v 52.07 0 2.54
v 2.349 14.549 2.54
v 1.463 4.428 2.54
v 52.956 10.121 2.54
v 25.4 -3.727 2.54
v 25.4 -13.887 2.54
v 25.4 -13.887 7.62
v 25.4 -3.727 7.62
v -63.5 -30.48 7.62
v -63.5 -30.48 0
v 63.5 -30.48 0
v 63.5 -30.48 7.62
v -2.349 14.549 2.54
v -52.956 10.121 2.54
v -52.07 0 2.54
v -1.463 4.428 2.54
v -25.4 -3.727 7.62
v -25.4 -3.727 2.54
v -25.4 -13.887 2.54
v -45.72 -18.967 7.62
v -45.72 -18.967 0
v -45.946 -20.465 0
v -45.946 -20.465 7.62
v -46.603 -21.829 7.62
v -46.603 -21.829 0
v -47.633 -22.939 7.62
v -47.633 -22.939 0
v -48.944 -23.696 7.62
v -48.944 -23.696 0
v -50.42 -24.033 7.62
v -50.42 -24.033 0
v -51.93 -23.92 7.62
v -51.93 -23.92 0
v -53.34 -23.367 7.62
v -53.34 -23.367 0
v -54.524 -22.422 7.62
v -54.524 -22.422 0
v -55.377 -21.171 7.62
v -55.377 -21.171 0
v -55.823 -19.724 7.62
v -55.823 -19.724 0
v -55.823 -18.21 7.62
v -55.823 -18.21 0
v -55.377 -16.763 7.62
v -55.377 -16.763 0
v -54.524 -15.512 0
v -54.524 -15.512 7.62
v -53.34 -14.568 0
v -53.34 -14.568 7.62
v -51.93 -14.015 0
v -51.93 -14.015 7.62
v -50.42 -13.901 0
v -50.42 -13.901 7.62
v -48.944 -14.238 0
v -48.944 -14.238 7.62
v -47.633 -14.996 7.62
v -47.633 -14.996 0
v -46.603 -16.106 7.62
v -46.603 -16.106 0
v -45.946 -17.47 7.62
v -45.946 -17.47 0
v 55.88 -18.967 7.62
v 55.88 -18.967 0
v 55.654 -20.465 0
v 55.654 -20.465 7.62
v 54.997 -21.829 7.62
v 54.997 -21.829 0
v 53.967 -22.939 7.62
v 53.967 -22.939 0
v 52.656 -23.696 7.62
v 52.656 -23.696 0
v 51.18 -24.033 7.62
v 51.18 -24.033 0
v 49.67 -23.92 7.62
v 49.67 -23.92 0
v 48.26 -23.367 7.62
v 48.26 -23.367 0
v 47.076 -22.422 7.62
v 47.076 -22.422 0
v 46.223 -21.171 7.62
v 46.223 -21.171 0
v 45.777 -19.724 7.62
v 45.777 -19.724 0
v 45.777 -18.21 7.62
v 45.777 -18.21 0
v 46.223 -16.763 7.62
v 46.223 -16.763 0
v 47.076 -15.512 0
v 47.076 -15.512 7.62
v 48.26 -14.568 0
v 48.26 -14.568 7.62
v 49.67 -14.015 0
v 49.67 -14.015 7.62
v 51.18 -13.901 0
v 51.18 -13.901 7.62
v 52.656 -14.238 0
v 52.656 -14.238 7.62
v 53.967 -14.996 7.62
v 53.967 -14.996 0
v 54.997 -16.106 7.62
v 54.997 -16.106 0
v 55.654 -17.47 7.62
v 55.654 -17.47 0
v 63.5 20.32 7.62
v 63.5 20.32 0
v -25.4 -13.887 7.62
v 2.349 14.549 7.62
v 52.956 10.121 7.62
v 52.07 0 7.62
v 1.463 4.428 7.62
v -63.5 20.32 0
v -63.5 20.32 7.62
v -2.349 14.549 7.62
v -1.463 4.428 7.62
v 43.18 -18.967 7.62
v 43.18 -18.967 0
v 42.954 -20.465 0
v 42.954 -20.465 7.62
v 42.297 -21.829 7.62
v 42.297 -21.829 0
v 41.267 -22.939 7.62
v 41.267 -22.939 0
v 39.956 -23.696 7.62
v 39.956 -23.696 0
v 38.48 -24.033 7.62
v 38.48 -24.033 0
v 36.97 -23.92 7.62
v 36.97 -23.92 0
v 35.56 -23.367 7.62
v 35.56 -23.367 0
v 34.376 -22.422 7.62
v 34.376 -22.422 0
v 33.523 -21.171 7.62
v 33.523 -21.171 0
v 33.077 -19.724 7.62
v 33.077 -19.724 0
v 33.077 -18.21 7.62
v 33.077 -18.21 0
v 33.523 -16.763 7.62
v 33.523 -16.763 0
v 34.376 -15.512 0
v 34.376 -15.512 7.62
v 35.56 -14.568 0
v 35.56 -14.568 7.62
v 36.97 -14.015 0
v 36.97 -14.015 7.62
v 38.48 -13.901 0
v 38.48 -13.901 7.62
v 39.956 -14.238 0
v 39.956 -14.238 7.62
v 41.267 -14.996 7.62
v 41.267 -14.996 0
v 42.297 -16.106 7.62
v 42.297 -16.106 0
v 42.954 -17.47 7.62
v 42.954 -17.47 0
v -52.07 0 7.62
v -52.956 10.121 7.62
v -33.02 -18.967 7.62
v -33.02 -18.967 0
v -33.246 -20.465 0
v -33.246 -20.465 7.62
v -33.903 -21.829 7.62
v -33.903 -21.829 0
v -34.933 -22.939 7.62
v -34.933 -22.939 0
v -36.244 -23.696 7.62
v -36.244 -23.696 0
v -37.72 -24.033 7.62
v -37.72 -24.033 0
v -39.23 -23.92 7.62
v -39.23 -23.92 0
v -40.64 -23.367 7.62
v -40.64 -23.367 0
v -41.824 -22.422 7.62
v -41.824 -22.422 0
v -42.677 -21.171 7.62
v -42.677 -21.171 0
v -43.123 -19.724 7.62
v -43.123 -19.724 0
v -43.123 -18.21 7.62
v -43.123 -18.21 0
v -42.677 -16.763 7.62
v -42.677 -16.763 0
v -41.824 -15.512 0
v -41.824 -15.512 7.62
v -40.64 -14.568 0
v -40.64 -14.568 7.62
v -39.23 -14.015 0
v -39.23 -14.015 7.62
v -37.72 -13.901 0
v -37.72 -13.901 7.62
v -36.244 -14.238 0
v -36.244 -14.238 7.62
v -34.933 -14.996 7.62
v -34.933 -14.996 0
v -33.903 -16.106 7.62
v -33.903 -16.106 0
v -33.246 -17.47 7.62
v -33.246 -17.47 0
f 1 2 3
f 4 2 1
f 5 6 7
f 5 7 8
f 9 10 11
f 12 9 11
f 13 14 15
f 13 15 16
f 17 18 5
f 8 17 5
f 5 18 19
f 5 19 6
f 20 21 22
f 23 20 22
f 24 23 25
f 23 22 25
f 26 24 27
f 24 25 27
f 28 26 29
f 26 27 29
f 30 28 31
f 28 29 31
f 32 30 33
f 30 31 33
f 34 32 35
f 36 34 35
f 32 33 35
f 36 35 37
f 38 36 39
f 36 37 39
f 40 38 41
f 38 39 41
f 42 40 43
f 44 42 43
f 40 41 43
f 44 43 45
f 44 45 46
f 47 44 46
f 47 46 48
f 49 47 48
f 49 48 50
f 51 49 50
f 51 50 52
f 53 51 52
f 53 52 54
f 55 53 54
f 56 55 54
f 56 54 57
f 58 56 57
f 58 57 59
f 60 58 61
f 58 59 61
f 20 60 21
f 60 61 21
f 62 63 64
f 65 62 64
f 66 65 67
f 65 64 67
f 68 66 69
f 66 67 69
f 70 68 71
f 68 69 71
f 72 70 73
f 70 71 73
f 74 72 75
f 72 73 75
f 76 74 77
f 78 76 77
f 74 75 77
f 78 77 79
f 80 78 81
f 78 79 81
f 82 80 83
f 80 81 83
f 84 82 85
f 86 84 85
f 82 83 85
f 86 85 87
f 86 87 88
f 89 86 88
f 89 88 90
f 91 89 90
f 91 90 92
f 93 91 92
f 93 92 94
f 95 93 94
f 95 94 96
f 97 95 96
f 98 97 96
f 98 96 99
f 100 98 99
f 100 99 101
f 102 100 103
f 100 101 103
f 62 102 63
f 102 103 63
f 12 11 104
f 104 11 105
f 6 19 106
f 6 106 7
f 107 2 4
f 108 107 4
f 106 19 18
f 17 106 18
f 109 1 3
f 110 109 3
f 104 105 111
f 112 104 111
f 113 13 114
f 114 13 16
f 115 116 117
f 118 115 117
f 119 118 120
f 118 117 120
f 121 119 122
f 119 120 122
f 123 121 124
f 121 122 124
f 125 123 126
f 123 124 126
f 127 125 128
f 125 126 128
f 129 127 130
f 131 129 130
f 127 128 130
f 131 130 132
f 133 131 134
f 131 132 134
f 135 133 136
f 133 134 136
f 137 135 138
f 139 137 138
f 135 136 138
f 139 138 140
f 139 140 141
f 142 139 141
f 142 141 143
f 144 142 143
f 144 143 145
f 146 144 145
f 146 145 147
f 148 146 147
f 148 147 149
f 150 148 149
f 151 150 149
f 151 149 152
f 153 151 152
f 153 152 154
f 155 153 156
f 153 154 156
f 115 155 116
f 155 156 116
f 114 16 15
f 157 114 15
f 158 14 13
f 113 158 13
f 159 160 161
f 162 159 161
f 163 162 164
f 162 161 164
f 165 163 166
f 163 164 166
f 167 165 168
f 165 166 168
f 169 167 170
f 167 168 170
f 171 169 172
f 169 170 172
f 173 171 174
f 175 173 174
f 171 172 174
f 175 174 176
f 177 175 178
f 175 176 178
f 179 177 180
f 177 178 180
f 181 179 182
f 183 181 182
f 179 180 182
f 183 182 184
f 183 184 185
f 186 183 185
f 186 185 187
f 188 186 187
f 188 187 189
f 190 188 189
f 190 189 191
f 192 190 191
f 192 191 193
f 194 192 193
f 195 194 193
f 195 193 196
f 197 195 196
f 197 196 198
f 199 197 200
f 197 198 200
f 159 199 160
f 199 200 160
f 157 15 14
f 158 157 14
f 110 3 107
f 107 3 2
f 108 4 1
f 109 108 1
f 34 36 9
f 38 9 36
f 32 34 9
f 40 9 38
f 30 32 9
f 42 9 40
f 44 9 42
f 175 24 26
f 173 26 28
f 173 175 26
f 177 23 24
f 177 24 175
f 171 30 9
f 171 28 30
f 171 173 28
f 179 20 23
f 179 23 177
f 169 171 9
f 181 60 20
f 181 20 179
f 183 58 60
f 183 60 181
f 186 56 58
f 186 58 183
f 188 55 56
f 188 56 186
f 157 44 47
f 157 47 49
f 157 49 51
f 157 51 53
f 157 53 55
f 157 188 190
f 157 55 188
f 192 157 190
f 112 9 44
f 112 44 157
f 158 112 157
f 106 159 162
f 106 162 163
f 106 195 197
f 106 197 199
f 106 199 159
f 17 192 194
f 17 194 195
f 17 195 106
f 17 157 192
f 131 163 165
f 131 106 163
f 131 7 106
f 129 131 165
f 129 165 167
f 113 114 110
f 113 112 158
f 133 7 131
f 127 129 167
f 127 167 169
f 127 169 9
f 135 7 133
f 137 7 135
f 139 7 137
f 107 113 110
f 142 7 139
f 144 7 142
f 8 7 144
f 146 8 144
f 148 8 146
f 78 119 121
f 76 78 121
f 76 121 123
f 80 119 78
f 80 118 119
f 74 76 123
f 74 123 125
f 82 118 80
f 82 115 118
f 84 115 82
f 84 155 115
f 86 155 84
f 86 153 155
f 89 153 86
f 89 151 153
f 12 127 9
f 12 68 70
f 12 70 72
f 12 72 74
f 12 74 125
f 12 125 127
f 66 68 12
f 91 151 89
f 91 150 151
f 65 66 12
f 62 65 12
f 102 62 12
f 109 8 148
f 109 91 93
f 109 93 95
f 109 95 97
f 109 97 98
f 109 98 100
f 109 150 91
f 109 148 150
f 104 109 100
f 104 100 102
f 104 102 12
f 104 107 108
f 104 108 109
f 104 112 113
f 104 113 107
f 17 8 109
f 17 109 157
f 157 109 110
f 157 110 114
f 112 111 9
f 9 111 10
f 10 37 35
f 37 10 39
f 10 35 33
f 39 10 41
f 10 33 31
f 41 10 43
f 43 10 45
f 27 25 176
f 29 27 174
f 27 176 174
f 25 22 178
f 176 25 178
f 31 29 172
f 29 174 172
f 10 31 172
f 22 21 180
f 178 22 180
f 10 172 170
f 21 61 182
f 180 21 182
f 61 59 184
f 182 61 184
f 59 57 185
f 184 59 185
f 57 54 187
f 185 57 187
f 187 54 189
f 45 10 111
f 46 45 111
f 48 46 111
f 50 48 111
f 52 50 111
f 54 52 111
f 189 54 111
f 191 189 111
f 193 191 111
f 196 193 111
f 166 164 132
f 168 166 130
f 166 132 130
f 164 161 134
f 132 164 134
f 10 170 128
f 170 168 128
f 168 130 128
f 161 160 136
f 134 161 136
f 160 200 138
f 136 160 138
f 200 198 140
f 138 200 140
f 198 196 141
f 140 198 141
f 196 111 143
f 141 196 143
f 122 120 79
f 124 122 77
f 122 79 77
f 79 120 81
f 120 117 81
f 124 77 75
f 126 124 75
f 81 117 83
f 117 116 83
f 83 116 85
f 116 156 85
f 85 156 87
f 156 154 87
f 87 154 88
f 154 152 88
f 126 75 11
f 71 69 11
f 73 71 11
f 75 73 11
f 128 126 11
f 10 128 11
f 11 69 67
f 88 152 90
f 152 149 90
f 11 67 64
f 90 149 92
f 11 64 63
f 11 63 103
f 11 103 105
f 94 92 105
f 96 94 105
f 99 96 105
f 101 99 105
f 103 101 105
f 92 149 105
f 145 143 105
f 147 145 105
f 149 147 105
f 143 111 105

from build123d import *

# Parameters (mm, degrees)
F0_W     = 50.8
F0_H     = 10.16
F1_DEPTH = 7.62
F2_DEPTH = 2.54


with BuildPart() as f1:
    # F0 (on Top) → F1 (new body)
    with BuildSketch(Plane.XY):
        with BuildLine():
            Line((0, 20.32), (-63.5, 20.32))
            Line((-63.5, 20.32), (-63.5, 0))
            Line((-63.5, 0), (-63.5, -18.967217))
            Line((-63.5, -18.967217), (-55.88, -18.967217))
            ThreePointArc((-55.88, -18.967217), (-50.8, -13.887217), (-45.72, -18.967217))
            Line((-45.72, -18.967217), (-43.18, -18.967217))
            ThreePointArc((-43.18, -18.967217), (-38.1, -13.887217), (-33.02, -18.967217))
            Line((-33.02, -18.967217), (33.02, -18.967217))
            ThreePointArc((33.02, -18.967217), (38.1, -13.887217), (43.18, -18.967217))
            Line((43.18, -18.967217), (45.72, -18.967217))
            ThreePointArc((45.72, -18.967217), (50.8, -13.887217), (55.88, -18.967217))
            Line((55.88, -18.967217), (63.5, -18.967217))
            Line((63.5, -18.967217), (63.5, 0))
            Line((63.5, 0), (63.5, 20.32))
            Line((63.5, 20.32), (0, 20.32))
        make_face()
        with Locations((0, -8.807217)):
            Rectangle(F0_W, F0_H, mode=Mode.SUBTRACT)
        Polygon((-1.463309, 4.427512), (-52.07, 0), (-52.955502, 10.121338), (-2.348812, 14.54885), align=None, mode=Mode.SUBTRACT)
        Polygon((2.348812, 14.54885), (52.955502, 10.121338), (52.07, 0), (1.463309, 4.427512), align=None, mode=Mode.SUBTRACT)
        with BuildLine():
            Line((-55.88, -18.967217), (-63.5, -18.967217))
            Line((-63.5, -18.967217), (-63.5, -30.48))
            Line((-63.5, -30.48), (0, -30.48))
            Line((0, -30.48), (63.5, -30.48))
            Line((63.5, -30.48), (63.5, -18.967217))
            Line((63.5, -18.967217), (55.88, -18.967217))
            ThreePointArc((55.88, -18.967217), (50.8, -24.047217), (45.72, -18.967217))
            Line((45.72, -18.967217), (43.18, -18.967217))
            ThreePointArc((43.18, -18.967217), (38.1, -24.047217), (33.02, -18.967217))
            Line((33.02, -18.967217), (-33.02, -18.967217))
            ThreePointArc((-33.02, -18.967217), (-38.1, -24.047217), (-43.18, -18.967217))
            Line((-43.18, -18.967217), (-45.72, -18.967217))
            ThreePointArc((-45.72, -18.967217), (-50.8, -24.047217), (-55.88, -18.967217))
        make_face()
    extrude(amount=F1_DEPTH)

    # F0 (on Top) → F2 (join)
    with BuildSketch(Plane.XY):
        with Locations((0, -8.807217)):
            Rectangle(F0_W, F0_H)
        Polygon((-52.955502, 10.121338), (-52.07, 0), (-1.463309, 4.427512), (-2.348812, 14.54885), align=None)
        Polygon((52.07, 0), (52.955502, 10.121338), (2.348812, 14.54885), (1.463309, 4.427512), align=None)
    extrude(amount=F2_DEPTH)


solid = f1.part
